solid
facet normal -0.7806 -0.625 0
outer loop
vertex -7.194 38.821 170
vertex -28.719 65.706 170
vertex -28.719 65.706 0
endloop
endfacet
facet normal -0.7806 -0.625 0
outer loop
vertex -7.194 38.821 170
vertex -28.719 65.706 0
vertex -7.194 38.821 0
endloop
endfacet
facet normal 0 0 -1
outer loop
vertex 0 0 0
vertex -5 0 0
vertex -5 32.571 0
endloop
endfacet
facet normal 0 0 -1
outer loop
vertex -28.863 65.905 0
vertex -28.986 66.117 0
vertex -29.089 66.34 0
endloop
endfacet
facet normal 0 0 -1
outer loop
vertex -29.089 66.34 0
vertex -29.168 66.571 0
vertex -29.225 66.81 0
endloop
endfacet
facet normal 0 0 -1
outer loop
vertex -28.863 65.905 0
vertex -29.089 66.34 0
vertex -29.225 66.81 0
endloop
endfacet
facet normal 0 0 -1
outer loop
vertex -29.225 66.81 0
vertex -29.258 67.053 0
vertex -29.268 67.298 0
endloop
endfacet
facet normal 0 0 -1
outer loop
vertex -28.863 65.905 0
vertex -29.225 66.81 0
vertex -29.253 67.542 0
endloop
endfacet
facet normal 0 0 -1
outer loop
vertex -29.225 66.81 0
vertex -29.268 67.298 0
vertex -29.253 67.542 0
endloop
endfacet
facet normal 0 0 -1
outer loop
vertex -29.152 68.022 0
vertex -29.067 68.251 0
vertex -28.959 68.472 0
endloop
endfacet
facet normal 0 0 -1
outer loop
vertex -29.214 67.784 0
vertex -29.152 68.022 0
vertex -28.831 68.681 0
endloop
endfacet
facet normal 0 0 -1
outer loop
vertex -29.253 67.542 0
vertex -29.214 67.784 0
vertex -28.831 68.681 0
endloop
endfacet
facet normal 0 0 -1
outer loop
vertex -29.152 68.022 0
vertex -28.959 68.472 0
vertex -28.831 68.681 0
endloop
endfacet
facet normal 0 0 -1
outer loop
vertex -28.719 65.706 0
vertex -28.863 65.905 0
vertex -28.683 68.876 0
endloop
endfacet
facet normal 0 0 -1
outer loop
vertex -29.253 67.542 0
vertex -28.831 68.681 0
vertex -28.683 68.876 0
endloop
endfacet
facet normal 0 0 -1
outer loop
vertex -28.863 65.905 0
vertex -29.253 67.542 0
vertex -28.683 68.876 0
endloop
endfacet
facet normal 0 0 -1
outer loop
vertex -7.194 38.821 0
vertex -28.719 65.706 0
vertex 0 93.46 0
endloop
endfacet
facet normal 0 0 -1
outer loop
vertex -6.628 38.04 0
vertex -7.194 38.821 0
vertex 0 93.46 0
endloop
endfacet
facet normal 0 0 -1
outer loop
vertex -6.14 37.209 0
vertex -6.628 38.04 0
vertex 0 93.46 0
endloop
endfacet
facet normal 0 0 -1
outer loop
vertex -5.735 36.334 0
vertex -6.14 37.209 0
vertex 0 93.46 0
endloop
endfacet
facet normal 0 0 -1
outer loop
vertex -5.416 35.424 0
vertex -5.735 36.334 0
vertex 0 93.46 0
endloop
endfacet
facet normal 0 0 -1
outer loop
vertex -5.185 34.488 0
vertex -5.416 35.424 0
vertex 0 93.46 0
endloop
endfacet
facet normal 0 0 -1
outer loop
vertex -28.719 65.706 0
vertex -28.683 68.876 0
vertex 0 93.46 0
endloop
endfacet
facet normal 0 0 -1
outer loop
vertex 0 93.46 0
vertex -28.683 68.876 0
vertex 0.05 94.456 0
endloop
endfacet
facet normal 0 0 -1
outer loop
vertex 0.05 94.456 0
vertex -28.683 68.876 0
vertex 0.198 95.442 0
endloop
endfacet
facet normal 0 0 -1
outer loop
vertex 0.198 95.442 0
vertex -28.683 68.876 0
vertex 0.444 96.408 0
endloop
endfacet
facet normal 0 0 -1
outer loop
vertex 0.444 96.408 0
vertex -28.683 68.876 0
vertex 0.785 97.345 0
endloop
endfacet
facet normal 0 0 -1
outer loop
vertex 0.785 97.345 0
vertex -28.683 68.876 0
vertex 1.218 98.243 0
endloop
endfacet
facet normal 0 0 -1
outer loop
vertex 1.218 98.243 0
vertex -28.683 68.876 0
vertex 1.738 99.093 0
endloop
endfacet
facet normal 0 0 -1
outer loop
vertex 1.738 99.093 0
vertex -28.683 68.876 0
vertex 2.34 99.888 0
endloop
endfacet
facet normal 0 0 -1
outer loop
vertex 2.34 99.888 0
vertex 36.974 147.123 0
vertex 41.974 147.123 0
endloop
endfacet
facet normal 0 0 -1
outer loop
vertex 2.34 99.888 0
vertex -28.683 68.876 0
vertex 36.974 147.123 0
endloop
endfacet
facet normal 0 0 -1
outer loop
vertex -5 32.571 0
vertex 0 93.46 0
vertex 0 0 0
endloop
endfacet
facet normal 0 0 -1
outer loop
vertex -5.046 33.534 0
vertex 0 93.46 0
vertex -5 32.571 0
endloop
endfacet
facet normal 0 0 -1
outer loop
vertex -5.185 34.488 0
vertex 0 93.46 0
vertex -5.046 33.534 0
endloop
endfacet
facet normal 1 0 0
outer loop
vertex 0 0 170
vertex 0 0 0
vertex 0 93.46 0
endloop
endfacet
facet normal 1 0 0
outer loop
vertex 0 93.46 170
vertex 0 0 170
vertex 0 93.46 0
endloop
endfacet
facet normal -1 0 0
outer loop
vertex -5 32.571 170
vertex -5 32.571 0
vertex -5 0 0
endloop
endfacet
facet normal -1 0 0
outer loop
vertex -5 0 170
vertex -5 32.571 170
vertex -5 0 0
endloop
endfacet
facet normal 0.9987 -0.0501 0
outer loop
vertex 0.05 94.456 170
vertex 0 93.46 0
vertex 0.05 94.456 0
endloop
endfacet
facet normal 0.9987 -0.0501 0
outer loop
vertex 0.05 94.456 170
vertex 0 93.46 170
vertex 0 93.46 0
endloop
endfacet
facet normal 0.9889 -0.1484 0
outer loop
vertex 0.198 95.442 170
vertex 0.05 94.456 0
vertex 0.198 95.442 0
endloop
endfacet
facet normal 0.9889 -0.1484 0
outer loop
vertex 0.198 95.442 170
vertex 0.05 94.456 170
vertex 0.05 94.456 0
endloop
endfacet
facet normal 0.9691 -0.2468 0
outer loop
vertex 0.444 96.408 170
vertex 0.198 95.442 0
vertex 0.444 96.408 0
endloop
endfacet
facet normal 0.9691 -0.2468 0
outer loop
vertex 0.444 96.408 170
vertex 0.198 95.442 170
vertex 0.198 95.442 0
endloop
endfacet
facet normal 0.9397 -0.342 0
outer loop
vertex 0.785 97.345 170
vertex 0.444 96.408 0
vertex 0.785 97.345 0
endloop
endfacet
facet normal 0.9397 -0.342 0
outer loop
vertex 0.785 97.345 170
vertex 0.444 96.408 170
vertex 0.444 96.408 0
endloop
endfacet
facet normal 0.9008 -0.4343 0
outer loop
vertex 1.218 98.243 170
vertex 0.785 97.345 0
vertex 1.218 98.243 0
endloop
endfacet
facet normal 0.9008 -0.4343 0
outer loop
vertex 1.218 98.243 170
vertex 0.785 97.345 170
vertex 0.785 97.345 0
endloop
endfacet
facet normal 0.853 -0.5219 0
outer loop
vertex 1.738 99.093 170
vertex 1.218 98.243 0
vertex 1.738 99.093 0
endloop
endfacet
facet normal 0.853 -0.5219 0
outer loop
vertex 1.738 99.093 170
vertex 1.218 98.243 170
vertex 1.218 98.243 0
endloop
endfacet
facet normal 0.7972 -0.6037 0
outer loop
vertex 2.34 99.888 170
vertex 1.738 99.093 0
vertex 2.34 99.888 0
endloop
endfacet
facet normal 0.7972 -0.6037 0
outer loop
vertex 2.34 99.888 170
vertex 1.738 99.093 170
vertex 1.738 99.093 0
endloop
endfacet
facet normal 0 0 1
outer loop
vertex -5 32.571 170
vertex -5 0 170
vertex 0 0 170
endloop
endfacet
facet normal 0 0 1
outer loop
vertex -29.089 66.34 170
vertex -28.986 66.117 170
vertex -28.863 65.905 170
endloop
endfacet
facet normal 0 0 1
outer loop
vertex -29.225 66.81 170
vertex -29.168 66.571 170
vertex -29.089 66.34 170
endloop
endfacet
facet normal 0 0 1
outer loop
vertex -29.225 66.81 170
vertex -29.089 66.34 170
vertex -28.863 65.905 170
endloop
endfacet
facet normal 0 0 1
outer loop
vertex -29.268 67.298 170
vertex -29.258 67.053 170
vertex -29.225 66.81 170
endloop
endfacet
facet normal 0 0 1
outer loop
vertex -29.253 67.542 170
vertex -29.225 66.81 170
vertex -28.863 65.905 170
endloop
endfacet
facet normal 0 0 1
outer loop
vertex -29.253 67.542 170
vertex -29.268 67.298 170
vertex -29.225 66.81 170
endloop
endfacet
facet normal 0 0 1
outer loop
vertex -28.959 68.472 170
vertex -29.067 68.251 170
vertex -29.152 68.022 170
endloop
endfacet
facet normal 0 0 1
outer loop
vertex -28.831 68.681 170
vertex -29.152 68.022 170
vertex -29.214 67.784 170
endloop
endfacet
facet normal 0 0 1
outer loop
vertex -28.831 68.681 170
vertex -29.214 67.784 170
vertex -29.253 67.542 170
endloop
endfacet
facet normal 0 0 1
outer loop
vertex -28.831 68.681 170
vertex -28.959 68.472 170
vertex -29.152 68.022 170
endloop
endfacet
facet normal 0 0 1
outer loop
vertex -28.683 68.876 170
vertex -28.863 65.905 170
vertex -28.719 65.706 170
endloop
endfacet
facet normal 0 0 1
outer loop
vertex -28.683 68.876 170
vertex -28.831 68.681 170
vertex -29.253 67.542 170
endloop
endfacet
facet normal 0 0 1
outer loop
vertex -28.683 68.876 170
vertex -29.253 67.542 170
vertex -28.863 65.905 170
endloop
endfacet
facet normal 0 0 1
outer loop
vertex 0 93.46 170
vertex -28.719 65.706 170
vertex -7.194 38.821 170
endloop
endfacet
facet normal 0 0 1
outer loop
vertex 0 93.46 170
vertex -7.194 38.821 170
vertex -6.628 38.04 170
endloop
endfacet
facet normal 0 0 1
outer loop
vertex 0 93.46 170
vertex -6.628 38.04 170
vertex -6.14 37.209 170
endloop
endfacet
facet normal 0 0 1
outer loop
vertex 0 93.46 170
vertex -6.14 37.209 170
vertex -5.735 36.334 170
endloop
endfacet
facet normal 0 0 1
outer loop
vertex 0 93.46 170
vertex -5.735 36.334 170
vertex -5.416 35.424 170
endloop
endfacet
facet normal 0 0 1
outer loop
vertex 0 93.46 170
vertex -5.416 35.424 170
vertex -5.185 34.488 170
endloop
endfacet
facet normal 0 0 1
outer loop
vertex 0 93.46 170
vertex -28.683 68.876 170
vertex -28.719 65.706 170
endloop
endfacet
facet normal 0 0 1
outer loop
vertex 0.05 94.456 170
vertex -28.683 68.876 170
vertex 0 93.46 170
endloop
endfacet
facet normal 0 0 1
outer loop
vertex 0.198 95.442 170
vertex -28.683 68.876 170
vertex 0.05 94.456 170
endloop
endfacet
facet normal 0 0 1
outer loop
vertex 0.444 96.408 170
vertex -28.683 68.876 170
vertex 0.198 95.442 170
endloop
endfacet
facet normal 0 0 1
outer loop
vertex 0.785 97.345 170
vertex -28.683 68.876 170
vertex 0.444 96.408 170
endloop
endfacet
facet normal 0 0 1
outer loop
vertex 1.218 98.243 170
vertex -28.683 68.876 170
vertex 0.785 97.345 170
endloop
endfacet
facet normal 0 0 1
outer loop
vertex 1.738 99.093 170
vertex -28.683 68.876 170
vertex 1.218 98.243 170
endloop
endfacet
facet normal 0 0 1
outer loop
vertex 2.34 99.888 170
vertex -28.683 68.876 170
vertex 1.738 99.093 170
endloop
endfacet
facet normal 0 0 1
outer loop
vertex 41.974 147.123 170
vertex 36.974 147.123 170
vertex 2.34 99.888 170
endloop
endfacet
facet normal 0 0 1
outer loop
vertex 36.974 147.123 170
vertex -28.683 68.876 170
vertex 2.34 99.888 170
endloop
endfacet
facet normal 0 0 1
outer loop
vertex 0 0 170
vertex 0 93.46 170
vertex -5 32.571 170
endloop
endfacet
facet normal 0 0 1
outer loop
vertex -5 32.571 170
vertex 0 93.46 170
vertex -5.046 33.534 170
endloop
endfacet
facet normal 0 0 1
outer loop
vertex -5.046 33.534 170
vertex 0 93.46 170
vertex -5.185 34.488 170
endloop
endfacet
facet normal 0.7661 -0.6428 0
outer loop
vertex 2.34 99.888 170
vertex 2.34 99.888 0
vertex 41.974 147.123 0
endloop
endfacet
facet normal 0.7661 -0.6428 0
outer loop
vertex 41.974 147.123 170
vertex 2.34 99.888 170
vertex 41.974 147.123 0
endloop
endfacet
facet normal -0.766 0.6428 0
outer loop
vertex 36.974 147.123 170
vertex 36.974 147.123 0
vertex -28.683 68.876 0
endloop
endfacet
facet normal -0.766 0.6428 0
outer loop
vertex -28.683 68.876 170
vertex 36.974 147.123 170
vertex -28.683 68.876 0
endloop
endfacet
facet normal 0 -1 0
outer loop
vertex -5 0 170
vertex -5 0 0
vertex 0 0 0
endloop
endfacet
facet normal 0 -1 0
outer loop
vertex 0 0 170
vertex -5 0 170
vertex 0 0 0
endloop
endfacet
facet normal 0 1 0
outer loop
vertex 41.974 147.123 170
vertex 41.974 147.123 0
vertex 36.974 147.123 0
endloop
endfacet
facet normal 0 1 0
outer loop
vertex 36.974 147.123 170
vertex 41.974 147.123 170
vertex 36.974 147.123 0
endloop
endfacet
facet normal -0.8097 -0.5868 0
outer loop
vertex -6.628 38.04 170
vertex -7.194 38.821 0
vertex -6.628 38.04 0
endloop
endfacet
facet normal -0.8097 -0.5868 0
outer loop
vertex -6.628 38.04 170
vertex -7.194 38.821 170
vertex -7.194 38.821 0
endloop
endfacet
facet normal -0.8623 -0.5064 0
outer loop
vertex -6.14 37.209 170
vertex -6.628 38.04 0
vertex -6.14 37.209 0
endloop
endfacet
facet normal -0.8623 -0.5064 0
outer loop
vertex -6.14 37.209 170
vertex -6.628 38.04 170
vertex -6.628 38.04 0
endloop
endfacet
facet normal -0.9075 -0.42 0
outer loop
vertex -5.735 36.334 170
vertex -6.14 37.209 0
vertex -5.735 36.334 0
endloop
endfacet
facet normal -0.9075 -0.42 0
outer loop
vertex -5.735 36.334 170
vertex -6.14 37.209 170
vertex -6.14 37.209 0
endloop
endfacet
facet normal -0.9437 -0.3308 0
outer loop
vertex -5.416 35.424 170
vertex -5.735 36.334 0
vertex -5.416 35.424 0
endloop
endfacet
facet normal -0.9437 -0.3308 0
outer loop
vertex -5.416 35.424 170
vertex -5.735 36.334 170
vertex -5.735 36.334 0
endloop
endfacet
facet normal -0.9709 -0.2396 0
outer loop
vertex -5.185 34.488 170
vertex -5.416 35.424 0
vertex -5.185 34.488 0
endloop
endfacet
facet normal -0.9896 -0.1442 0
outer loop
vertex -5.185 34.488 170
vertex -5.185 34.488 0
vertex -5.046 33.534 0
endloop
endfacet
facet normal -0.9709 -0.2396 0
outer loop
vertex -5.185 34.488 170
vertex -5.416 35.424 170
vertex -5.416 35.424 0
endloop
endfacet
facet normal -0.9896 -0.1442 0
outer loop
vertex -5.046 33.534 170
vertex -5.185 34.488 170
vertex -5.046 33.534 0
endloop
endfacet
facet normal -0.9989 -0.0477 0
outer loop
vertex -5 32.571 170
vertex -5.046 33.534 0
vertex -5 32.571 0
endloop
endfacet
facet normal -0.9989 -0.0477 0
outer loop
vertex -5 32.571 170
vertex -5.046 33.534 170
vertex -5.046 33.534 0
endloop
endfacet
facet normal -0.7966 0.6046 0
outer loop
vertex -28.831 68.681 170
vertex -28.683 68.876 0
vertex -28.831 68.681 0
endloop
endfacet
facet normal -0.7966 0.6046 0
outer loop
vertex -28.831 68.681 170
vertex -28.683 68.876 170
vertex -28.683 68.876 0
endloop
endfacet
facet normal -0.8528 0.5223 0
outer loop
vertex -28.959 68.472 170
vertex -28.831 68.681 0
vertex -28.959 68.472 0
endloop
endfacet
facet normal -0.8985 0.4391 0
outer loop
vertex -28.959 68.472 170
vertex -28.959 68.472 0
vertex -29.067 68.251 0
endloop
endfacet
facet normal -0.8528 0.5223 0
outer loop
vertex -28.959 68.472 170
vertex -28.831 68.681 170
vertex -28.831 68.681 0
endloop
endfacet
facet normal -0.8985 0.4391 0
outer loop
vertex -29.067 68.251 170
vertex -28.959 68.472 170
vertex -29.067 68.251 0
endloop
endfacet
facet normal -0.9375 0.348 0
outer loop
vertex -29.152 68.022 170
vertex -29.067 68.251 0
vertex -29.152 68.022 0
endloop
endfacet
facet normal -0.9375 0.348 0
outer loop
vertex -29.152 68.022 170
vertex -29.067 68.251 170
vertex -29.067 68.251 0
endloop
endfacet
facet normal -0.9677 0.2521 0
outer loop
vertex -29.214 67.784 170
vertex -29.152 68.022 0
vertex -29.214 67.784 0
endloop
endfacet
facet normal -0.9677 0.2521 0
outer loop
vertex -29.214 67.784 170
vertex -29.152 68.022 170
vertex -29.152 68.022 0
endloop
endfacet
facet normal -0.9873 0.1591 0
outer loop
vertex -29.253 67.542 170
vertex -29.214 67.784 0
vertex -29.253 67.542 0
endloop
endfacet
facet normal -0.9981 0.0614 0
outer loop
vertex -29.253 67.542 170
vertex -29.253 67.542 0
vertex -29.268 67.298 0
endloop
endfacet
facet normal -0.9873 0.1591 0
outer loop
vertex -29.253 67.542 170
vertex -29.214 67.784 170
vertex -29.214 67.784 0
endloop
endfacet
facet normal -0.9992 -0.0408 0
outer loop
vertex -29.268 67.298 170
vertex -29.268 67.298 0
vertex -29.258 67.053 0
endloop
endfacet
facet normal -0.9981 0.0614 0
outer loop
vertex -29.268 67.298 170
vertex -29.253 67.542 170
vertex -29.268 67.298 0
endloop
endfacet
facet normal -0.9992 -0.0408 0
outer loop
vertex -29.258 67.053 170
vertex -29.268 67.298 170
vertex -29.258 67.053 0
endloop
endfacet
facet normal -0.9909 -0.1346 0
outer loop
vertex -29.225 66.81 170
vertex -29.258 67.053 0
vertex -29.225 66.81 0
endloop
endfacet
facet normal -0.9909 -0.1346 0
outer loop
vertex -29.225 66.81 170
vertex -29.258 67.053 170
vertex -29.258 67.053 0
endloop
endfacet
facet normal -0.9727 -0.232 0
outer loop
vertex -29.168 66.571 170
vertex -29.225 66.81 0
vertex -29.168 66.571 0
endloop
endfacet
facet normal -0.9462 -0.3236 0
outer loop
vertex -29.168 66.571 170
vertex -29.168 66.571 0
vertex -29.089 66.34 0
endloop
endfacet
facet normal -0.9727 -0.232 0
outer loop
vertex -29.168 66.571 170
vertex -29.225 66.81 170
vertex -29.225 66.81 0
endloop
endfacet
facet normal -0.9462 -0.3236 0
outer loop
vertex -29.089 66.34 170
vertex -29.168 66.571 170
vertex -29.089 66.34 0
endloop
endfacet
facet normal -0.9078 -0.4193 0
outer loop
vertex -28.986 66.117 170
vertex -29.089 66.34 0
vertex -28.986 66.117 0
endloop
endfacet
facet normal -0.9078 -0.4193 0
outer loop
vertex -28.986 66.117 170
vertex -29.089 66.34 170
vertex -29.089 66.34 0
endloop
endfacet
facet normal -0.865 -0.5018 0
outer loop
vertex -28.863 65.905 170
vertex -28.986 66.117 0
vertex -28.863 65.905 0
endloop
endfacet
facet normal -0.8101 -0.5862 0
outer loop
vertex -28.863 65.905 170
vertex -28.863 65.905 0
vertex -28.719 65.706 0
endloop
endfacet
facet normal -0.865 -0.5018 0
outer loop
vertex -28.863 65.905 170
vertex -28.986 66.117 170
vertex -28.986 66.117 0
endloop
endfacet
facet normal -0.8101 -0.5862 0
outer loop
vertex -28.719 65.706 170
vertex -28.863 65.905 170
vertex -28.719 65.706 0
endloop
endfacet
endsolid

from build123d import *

# Parameters (mm, degrees)
FUNNEL_RIGHT_SIDE_DEPTH = 170
FILLET2_R               = 10
FILLET3_R               = 2.5


with BuildPart() as part:
    # Sketch1 → Funnel - Right Side (new body)
    with BuildSketch(Plane.XY):
        Polygon((0, 0), (0, 97.1), (41.974030913, 147.122702136), (36.974030913, 147.122702136), (-30, 67.306160185), (-5, 36.081170193), (-5, 0), align=None)
    extrude(amount=FUNNEL_RIGHT_SIDE_DEPTH)

    # Fillet2
    fillet2_edges = [part.edges().sort_by_distance(p)[0] for p in [
        (-5, 36.081170193, 85),
        (0, 97.1, 85),
    ]]
    fillet(fillet2_edges, radius=FILLET2_R)

    # Fillet3
    fillet3_edges = [part.edges().sort_by_distance(p)[0] for p in [
        (-30, 67.306160185, 85),
    ]]
    fillet(fillet3_edges, radius=FILLET3_R)


solid = part.part
